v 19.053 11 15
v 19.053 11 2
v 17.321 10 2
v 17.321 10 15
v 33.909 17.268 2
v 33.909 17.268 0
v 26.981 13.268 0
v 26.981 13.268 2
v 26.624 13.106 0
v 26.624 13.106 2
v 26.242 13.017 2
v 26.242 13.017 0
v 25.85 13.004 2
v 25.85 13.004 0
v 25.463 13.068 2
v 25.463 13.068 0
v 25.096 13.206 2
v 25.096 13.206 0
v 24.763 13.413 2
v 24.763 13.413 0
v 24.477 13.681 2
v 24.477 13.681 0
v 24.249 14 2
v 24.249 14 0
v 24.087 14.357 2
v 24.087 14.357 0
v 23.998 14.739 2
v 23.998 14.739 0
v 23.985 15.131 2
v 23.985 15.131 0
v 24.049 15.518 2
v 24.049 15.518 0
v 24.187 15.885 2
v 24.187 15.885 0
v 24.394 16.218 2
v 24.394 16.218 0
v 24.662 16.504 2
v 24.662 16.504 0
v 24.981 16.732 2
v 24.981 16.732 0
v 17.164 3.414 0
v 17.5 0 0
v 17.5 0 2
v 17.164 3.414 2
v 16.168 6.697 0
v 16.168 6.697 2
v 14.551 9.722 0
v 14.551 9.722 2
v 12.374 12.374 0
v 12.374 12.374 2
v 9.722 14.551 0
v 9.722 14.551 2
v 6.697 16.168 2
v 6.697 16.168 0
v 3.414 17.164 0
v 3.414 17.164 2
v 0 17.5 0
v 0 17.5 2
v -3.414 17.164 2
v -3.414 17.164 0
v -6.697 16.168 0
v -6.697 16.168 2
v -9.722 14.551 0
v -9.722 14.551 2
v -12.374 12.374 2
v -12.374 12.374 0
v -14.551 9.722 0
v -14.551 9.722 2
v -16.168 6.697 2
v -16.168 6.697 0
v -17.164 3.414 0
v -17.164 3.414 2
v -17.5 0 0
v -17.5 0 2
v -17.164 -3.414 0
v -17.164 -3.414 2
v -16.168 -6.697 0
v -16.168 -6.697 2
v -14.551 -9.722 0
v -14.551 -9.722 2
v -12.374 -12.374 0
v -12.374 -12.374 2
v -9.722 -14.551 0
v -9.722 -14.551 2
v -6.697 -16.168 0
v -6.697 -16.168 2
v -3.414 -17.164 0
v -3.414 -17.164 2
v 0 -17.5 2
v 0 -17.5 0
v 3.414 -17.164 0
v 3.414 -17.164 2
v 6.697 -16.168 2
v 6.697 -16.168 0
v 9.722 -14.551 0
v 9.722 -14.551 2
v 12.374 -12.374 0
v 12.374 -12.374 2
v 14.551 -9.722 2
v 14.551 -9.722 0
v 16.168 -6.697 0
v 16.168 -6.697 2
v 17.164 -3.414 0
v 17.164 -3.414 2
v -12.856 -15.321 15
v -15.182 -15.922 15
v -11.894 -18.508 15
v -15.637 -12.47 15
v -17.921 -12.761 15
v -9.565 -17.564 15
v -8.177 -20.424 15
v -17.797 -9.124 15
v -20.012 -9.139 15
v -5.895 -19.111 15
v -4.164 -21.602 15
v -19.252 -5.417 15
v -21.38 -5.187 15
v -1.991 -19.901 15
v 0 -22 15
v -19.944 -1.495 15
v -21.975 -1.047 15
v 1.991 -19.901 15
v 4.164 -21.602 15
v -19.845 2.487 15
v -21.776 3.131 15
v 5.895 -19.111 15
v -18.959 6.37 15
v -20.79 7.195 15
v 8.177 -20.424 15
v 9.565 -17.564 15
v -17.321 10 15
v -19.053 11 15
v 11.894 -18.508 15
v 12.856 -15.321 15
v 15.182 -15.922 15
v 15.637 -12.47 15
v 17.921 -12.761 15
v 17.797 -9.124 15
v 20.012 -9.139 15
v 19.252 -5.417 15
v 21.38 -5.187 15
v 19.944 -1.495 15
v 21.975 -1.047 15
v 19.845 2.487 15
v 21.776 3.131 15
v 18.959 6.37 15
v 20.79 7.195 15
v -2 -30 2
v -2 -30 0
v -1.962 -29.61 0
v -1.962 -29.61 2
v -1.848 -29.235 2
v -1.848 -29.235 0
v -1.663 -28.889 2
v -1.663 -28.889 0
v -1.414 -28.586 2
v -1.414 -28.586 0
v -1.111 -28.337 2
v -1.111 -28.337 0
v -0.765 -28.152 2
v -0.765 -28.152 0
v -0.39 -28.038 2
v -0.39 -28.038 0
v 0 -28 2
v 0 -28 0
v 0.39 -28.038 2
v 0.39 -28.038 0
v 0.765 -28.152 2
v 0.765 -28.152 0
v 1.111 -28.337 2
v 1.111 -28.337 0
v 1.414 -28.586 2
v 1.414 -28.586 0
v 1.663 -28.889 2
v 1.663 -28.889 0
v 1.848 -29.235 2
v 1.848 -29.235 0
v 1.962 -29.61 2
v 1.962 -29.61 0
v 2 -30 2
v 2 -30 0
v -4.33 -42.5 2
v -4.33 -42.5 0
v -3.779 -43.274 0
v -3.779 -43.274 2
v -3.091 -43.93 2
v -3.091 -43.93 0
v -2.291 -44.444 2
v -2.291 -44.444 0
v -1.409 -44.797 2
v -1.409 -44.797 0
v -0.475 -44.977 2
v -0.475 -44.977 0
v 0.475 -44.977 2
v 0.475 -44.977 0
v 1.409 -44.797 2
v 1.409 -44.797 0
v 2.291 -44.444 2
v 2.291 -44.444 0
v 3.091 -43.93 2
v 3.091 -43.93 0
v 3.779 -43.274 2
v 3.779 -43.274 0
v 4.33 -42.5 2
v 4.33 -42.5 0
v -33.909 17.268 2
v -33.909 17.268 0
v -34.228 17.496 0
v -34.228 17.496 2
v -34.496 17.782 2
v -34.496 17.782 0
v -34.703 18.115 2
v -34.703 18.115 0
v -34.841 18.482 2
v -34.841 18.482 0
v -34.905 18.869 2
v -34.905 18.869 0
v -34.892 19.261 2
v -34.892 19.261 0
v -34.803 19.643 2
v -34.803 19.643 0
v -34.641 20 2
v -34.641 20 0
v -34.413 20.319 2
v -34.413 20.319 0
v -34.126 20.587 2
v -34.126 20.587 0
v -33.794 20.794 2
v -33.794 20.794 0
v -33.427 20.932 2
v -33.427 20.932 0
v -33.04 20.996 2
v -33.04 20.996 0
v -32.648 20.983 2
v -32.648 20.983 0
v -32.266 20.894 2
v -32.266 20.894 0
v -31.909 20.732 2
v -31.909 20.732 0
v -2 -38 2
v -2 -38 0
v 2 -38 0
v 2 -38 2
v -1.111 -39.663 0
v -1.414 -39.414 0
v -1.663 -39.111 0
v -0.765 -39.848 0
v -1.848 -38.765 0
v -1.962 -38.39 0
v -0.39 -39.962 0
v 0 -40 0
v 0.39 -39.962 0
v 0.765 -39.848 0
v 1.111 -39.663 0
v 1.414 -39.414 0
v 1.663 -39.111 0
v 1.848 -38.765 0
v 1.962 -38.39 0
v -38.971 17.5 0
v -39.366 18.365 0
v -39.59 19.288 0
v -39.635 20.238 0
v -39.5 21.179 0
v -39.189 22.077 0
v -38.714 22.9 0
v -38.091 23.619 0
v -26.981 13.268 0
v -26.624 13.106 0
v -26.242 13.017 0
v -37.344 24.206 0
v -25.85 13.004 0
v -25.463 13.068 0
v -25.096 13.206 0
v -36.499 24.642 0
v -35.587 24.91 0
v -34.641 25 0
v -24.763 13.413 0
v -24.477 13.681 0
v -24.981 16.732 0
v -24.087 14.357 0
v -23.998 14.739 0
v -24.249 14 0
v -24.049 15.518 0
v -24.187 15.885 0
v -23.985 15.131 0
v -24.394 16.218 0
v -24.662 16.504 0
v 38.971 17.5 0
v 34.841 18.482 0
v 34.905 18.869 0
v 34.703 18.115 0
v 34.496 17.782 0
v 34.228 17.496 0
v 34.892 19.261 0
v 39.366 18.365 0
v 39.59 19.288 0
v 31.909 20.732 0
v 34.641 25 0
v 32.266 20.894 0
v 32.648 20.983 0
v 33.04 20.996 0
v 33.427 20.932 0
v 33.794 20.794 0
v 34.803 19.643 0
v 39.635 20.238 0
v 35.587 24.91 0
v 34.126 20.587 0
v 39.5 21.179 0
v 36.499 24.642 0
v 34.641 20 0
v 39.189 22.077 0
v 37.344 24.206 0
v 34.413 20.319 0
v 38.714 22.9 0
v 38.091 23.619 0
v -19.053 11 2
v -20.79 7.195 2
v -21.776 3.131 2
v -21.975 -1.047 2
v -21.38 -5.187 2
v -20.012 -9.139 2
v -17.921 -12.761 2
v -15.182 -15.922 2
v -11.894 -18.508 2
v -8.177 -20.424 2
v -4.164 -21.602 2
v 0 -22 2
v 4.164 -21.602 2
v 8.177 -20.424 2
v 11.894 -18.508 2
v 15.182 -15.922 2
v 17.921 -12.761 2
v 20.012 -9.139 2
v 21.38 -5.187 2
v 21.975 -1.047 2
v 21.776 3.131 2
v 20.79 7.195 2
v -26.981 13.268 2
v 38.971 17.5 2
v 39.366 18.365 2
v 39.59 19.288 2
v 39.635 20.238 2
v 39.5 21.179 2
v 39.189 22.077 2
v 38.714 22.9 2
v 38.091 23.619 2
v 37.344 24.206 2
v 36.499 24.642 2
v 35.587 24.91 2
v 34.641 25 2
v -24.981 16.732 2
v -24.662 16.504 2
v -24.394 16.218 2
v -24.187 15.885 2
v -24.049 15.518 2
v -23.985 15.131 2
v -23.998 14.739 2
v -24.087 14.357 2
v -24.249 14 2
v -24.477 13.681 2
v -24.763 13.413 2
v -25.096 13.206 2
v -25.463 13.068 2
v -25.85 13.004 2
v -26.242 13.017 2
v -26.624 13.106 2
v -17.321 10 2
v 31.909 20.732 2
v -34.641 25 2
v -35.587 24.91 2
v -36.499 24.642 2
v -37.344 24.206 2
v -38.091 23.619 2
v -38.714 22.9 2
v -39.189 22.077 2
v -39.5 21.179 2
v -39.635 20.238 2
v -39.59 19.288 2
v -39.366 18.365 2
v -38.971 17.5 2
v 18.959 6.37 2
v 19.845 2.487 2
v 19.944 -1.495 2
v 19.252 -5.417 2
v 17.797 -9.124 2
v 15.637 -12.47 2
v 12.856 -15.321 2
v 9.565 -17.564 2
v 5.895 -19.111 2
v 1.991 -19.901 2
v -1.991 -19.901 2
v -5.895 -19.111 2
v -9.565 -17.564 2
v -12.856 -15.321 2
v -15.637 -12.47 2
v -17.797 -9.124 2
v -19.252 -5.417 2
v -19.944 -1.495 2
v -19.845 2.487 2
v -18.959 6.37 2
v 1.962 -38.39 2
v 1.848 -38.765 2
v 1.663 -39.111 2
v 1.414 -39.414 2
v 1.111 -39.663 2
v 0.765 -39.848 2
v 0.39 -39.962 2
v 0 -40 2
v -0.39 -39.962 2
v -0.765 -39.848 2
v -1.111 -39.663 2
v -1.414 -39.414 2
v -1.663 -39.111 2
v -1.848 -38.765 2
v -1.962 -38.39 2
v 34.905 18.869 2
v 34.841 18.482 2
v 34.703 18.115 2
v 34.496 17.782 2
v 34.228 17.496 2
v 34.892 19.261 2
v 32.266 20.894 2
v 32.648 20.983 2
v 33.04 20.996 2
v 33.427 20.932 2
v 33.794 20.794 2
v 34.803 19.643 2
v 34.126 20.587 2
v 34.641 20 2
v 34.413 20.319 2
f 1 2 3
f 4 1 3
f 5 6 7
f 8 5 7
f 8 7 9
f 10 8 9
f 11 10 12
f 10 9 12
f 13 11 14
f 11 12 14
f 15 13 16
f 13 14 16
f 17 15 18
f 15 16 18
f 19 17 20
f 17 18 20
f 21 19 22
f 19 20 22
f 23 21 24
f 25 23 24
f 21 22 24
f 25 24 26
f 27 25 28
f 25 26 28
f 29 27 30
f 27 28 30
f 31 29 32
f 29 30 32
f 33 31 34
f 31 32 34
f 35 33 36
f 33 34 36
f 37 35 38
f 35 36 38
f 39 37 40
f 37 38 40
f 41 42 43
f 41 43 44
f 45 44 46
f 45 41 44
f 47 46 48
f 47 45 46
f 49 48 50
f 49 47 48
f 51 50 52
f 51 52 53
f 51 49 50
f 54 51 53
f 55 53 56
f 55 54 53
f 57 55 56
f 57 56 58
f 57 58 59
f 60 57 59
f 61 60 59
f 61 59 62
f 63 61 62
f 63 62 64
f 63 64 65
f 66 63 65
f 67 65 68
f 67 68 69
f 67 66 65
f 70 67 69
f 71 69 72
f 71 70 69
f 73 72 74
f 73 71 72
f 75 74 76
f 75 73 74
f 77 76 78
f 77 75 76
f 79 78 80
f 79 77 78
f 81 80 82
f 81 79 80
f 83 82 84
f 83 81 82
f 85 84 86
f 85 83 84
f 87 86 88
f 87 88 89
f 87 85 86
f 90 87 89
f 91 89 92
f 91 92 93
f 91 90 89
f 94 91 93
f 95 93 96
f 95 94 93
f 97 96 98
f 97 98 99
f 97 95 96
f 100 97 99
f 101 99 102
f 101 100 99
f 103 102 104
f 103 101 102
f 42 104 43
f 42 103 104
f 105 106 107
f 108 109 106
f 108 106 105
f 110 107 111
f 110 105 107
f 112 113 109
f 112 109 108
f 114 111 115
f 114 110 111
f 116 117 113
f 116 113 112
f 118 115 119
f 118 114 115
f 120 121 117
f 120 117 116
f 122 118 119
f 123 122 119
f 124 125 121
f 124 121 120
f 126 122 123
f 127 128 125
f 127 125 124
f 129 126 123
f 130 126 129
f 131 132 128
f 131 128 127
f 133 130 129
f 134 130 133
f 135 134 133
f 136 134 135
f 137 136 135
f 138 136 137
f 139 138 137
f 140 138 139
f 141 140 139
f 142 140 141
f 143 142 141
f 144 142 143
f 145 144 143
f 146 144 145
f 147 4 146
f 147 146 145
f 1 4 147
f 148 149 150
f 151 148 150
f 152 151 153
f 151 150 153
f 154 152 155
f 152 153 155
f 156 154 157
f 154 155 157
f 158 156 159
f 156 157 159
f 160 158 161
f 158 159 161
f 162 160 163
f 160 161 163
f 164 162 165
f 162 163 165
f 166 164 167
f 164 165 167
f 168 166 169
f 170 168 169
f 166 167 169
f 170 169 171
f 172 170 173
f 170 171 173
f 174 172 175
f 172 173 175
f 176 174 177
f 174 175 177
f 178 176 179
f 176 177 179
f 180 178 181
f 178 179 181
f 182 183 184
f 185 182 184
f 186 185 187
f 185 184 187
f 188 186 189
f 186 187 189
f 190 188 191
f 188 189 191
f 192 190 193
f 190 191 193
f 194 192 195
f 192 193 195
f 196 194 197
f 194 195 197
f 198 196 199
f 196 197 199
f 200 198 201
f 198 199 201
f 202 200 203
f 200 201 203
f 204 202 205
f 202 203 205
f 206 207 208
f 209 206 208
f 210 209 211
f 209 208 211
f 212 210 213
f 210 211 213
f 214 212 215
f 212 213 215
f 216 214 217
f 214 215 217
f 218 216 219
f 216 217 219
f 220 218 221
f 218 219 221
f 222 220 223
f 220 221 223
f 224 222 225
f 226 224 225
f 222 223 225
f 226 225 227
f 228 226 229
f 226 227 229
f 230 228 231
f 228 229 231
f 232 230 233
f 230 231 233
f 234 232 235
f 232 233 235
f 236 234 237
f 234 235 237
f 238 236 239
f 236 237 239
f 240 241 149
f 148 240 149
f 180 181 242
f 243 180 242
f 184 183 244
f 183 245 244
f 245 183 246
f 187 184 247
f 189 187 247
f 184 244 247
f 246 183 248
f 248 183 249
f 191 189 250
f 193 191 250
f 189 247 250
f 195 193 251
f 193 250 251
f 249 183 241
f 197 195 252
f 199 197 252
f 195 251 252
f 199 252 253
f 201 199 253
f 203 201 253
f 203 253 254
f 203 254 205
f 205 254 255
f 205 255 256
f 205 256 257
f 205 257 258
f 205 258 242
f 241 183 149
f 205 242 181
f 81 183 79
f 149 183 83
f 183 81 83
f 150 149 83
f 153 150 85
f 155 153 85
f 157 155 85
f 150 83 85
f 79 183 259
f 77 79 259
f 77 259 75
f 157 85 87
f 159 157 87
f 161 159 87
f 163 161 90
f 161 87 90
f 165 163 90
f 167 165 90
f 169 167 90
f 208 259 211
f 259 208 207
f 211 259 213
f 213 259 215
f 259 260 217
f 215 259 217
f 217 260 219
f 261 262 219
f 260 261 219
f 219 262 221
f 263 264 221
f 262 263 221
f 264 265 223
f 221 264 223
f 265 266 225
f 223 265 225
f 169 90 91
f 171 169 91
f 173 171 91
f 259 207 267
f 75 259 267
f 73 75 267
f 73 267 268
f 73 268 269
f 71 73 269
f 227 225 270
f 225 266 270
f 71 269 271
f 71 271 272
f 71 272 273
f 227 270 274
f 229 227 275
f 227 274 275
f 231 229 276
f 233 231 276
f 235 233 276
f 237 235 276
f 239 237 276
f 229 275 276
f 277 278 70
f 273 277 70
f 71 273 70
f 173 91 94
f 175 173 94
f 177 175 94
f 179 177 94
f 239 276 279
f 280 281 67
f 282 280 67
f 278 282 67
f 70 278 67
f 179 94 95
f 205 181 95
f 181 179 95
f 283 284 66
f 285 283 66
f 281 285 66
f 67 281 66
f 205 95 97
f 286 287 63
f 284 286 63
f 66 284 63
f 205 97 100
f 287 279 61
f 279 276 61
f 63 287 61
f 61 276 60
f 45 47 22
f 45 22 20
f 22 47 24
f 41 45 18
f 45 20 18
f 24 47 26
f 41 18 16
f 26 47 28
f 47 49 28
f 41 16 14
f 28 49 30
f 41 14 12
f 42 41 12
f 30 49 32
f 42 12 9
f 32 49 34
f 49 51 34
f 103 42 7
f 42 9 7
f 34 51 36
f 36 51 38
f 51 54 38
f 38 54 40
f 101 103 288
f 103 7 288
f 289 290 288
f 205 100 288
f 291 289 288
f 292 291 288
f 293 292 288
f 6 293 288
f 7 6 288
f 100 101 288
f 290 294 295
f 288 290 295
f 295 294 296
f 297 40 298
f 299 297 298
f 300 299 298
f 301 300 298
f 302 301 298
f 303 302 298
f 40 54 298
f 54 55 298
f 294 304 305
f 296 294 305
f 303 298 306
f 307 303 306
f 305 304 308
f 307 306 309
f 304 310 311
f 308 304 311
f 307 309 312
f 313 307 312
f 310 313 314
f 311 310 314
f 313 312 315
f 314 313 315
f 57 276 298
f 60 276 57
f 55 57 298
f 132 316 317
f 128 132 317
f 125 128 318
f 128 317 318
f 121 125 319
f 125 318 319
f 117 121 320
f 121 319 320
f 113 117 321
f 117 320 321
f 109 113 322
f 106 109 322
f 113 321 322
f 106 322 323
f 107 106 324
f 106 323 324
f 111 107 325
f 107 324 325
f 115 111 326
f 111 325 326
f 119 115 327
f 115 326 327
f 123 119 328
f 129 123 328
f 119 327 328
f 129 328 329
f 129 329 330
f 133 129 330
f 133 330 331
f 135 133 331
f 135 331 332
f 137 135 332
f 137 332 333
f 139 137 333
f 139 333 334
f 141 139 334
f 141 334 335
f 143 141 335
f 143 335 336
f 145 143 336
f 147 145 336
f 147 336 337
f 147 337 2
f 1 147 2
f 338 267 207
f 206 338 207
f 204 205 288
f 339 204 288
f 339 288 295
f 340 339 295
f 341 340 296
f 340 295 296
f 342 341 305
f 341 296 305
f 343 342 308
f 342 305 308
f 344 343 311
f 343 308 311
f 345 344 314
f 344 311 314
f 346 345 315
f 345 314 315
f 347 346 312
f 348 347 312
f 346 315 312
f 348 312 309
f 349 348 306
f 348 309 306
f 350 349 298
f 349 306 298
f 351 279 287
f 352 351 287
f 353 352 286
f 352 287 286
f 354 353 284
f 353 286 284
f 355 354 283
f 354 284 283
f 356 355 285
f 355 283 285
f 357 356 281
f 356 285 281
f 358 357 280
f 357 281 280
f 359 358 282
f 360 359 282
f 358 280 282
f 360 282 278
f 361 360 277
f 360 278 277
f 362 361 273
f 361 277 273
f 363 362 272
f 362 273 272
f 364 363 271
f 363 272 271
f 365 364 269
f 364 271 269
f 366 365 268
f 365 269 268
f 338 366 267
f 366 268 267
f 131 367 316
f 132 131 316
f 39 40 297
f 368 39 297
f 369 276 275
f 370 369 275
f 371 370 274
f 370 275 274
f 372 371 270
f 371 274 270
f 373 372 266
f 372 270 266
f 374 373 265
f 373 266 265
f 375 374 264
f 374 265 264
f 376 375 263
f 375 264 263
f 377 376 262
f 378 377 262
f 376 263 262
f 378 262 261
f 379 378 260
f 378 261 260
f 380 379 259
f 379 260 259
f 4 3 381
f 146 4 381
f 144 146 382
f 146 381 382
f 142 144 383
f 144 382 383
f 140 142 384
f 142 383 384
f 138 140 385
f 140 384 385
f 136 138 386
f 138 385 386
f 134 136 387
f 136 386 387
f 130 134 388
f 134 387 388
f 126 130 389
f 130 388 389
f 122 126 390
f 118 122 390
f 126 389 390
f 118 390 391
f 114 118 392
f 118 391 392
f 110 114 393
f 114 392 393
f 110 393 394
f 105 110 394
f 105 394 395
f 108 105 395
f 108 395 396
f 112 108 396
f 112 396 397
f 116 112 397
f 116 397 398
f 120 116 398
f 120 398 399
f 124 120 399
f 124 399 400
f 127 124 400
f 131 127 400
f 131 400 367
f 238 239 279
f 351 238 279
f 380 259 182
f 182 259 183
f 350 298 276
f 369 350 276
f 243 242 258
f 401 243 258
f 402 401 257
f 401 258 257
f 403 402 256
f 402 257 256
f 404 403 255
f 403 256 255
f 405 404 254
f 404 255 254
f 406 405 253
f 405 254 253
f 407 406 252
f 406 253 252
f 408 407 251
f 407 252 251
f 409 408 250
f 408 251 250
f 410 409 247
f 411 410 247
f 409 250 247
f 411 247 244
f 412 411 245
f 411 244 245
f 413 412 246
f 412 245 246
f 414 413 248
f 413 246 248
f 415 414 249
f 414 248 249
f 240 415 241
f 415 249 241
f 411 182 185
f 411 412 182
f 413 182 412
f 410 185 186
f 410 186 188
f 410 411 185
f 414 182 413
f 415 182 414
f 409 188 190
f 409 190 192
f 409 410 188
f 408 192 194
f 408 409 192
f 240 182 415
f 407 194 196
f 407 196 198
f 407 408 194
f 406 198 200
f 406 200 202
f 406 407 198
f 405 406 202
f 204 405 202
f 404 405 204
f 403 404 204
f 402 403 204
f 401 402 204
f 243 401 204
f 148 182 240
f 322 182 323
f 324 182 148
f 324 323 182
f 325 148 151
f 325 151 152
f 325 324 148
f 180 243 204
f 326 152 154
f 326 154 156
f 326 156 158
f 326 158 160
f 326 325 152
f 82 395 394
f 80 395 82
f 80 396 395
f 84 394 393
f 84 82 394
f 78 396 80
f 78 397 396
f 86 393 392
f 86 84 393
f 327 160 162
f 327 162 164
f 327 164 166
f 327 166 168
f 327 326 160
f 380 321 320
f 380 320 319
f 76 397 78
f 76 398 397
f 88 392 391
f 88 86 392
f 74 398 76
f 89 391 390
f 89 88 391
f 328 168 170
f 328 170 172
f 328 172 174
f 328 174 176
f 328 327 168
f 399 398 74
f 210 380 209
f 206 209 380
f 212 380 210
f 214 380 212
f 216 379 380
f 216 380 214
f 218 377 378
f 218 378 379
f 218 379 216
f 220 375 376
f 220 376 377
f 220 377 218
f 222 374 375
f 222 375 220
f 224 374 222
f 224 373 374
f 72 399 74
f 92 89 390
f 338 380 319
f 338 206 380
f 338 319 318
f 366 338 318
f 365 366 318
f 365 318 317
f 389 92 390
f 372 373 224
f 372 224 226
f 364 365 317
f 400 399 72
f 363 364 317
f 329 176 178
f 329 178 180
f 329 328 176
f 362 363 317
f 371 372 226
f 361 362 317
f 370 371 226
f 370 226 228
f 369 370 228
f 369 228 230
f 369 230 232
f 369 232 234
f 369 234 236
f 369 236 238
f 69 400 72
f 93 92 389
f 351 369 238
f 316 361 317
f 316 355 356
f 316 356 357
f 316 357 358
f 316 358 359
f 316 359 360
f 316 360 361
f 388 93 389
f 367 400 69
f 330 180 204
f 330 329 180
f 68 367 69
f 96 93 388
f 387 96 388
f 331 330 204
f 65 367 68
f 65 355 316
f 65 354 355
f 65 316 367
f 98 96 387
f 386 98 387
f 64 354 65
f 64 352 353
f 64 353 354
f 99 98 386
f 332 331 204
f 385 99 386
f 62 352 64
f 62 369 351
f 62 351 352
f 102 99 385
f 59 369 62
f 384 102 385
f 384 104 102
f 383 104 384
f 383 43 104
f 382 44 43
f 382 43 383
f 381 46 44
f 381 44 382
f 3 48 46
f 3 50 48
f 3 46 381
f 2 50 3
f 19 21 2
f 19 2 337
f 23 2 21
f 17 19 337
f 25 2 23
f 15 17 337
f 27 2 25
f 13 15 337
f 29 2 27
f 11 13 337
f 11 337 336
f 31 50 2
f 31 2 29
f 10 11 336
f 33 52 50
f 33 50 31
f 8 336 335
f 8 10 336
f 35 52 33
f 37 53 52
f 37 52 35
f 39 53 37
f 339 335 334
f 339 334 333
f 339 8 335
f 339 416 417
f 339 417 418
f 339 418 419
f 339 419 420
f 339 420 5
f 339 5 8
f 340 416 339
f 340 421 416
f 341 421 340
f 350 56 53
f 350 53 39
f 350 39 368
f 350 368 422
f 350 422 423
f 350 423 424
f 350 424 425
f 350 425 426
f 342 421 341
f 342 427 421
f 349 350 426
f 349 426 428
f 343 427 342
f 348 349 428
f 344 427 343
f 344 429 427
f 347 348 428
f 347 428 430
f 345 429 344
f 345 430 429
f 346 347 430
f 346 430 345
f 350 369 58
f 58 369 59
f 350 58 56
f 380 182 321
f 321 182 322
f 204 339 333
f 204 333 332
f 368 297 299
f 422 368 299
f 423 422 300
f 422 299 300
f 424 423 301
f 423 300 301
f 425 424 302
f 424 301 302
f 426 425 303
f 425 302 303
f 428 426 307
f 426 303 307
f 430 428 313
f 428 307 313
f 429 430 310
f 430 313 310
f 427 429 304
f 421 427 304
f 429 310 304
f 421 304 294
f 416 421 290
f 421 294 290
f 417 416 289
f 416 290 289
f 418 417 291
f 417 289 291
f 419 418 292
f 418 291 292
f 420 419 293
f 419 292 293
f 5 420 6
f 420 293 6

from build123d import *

# Parameters (mm, degrees)
F0_R     = 17.5
F1_DEPTH = 2
F2_DEPTH = 15


with BuildPart() as f1:
    # F0 (on Top) → F1 (new body)
    with BuildSketch(Plane.XY):
        with BuildLine():
            Line((34.641016, 25), (-34.641016, 25))
            ThreePointArc((-34.641016, 25), (-38.971143, 22.5), (-38.971143, 17.5))
            Line((-38.971143, 17.5), (-4.330127, -42.5))
            ThreePointArc((-4.330127, -42.5), (0, -45), (4.330127, -42.5))
            Line((4.330127, -42.5), (38.971143, 17.5))
            ThreePointArc((38.971143, 17.5), (38.971143, 22.5), (34.641016, 25))
        make_face()
        with BuildLine():
            ThreePointArc((2, -38), (0, -40), (-2, -38))
            Line((-2, -38), (-2, -30))
            ThreePointArc((-2, -30), (0, -28), (2, -30))
            Line((2, -30), (2, -38))
        make_face(mode=Mode.SUBTRACT)
        with BuildLine():
            ThreePointArc((-33.908965, 17.267949), (-34.641016, 20), (-31.908965, 20.732051))
            Line((-31.908965, 20.732051), (-24.980762, 16.732051))
            ThreePointArc((-24.980762, 16.732051), (-24.248711, 14), (-26.980762, 13.267949))
            Line((-26.980762, 13.267949), (-33.908965, 17.267949))
        make_face(mode=Mode.SUBTRACT)
        with BuildLine():
            Line((-19.052559, 11), (-17.320508, 10))
            ThreePointArc((-17.320508, 10), (0, -20), (17.320508, 10))
            Line((17.320508, 10), (19.052559, 11))
            ThreePointArc((19.052559, 11), (0, -22), (-19.052559, 11))
        make_face(mode=Mode.SUBTRACT)
        Circle(F0_R, mode=Mode.SUBTRACT)
        with BuildLine():
            ThreePointArc((31.908965, 20.732051), (34.641016, 20), (33.908965, 17.267949))
            Line((33.908965, 17.267949), (26.980762, 13.267949))
            ThreePointArc((26.980762, 13.267949), (24.248711, 14), (24.980762, 16.732051))
            Line((24.980762, 16.732051), (31.908965, 20.732051))
        make_face(mode=Mode.SUBTRACT)
    extrude(amount=F1_DEPTH)

    # F0 (on Top) → F2 (join)
    with BuildSketch(Plane.XY):
        with BuildLine():
            ThreePointArc((17.320508, 10), (0, -20), (-17.320508, 10))
            Line((-17.320508, 10), (-19.052559, 11))
            ThreePointArc((-19.052559, 11), (0, -22), (19.052559, 11))
            Line((19.052559, 11), (17.320508, 10))
        make_face()
    extrude(amount=F2_DEPTH)


solid = f1.part
